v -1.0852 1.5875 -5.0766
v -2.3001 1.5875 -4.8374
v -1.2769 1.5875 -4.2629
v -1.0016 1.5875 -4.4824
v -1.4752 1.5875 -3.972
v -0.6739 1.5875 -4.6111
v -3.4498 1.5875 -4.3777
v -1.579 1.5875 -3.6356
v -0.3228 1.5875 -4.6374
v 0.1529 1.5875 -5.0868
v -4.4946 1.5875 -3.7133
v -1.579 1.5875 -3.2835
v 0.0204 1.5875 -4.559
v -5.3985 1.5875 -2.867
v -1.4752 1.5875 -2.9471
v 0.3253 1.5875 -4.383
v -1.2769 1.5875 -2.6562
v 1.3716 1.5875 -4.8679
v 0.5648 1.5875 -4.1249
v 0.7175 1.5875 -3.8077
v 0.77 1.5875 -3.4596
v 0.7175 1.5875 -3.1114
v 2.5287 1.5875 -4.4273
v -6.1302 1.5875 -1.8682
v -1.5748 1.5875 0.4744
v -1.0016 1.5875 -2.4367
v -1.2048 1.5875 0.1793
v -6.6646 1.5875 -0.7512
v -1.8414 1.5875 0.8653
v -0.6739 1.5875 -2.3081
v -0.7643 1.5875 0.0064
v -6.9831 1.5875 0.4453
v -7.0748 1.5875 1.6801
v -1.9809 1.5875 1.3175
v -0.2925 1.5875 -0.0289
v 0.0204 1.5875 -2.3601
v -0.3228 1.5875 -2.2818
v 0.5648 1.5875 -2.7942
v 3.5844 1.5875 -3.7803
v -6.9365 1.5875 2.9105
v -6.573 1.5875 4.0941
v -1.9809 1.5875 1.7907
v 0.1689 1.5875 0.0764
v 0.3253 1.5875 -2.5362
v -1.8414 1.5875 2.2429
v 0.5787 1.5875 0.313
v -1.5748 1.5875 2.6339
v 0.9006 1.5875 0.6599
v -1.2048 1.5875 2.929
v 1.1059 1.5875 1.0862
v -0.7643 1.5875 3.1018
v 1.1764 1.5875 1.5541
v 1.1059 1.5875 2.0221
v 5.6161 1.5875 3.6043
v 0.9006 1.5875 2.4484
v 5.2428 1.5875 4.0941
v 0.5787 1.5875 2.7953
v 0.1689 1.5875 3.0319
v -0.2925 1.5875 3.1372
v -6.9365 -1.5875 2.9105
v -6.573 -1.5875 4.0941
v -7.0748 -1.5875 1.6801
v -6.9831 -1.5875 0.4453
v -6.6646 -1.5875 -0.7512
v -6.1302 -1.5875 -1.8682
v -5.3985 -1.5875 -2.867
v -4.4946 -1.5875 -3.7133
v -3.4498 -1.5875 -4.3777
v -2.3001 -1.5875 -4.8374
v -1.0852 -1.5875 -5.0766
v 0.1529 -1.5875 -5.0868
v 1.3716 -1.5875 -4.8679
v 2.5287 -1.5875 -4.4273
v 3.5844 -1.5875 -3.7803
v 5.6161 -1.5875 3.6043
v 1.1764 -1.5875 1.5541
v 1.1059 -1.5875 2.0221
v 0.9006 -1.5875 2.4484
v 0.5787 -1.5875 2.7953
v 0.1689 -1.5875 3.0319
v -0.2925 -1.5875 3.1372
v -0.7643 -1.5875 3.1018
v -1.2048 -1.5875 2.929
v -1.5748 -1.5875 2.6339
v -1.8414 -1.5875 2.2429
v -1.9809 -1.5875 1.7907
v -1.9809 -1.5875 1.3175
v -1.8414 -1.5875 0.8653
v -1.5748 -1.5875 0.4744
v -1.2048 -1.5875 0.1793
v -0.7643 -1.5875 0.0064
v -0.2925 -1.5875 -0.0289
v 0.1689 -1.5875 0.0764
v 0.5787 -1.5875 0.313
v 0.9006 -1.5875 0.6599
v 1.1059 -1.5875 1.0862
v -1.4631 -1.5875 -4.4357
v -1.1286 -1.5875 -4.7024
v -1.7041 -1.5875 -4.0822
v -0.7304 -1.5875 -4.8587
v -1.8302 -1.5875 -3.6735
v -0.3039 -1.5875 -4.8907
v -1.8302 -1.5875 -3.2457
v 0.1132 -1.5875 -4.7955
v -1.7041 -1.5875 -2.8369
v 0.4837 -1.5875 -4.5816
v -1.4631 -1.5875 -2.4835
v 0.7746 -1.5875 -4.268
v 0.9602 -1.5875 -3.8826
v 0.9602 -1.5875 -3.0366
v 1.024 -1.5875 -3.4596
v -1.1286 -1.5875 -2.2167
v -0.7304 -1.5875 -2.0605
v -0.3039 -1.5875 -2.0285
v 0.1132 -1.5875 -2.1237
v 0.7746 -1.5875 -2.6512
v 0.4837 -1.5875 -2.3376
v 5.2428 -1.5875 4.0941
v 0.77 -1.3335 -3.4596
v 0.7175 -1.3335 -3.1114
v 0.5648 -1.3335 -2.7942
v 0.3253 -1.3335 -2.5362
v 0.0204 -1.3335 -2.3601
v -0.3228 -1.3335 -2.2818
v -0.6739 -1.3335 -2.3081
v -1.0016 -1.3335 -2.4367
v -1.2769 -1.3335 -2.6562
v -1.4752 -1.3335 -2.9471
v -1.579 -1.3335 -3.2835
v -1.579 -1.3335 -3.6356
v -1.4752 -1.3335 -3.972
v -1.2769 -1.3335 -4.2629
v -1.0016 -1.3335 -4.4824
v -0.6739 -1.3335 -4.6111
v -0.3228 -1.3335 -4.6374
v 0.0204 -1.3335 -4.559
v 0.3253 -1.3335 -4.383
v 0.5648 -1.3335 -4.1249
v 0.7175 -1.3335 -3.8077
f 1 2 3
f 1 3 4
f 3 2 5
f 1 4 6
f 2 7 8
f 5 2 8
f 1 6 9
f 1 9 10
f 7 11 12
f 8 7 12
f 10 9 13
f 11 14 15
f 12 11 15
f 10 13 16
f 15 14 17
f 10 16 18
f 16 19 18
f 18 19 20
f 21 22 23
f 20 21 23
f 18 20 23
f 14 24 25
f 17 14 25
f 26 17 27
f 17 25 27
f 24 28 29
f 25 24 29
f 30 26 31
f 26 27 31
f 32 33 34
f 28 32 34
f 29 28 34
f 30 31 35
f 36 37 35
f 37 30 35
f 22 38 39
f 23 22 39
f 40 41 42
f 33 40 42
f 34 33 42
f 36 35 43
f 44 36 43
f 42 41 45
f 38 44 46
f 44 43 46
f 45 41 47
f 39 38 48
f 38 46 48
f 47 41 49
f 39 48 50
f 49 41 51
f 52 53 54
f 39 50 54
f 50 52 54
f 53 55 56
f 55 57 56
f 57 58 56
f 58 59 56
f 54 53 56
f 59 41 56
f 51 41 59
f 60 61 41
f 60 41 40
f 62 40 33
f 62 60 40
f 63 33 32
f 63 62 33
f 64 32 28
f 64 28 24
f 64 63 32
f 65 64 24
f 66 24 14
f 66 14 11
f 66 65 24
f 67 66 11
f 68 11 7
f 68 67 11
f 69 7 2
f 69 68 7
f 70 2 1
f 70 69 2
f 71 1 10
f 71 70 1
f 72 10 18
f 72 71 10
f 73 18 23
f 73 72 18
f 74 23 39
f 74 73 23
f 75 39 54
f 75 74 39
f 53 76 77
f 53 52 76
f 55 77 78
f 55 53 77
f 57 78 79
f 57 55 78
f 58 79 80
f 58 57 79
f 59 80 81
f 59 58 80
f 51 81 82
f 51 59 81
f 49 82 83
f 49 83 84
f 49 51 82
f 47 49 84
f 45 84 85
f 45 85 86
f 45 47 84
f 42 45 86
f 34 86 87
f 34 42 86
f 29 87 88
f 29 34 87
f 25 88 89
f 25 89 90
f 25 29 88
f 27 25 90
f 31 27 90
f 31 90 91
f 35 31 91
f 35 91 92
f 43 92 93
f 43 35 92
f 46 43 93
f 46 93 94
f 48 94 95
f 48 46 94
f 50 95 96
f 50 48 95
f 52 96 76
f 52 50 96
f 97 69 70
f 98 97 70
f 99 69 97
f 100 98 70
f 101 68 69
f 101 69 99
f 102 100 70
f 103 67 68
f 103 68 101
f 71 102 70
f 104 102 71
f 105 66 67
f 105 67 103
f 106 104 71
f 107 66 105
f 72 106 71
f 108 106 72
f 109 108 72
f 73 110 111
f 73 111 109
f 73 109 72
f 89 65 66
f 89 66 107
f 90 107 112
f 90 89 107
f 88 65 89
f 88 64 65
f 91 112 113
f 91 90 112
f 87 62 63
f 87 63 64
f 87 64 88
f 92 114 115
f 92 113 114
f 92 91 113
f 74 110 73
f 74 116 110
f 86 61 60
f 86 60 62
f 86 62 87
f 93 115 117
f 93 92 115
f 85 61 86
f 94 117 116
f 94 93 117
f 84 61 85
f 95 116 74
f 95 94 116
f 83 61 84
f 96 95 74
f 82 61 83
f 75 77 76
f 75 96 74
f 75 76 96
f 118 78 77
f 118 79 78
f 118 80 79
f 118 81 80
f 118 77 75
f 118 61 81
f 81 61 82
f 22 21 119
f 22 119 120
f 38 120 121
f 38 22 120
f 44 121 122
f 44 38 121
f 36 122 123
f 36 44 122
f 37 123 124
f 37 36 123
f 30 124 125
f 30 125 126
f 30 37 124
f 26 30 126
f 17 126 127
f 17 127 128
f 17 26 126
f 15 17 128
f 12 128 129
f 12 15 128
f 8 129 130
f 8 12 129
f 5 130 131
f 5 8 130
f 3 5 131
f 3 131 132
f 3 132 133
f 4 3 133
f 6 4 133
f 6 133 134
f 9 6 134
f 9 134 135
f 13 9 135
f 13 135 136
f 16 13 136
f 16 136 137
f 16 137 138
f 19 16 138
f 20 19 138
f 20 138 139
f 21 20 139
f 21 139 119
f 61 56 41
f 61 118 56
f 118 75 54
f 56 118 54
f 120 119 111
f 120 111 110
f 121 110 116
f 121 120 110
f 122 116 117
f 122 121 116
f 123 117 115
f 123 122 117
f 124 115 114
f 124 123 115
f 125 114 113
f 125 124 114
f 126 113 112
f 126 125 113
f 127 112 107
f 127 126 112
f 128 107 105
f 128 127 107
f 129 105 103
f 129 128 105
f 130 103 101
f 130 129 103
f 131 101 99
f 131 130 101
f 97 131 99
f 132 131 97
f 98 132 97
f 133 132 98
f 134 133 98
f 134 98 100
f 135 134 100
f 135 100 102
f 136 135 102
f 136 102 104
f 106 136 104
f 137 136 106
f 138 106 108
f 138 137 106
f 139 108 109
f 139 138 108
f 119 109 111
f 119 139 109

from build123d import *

# Parameters (mm, degrees)
F0_R     = 1.1811
F0_R_2   = 1.5875
F1_DEPTH = 1.5875
F2_SIZE2 = 0.254
F2_SIZE  = 0.254
F3_SIZE  = 0.508


with BuildPart() as f1:
    # F0 (on Front) → F1 (new body, symmetric)
    with BuildSketch(Plane.XZ):
        with BuildLine():
            Line((5.750813, 4.094138), (-6.573008, 4.094138))
            ThreePointArc((-6.573008, 4.094138), (-4.49461, -3.713278), (3.584436, -3.780322))
            Line((3.584436, -3.780322), (5.750813, 4.094138))
        make_face()
        with Locations((-0.411098, -3.459583)):
            Circle(F0_R, mode=Mode.SUBTRACT)
        with Locations((-0.411098, 1.554138)):
            Circle(F0_R_2, mode=Mode.SUBTRACT)
    extrude(amount=F1_DEPTH, both=True)

    # F2
    f2_edges = [f1.edges().sort_by_distance(p)[0] for p in [
        (-1.592198, -1.5875, -3.459583),
    ]]
    chamfer(f2_edges, length=F2_SIZE, length2=F2_SIZE2)

    # F3
    f3_edges = [f1.edges().sort_by_distance(p)[0] for p in [
        (5.750813, 0, 4.094138),
    ]]
    chamfer(f3_edges, length=F3_SIZE)


solid = f1.part
